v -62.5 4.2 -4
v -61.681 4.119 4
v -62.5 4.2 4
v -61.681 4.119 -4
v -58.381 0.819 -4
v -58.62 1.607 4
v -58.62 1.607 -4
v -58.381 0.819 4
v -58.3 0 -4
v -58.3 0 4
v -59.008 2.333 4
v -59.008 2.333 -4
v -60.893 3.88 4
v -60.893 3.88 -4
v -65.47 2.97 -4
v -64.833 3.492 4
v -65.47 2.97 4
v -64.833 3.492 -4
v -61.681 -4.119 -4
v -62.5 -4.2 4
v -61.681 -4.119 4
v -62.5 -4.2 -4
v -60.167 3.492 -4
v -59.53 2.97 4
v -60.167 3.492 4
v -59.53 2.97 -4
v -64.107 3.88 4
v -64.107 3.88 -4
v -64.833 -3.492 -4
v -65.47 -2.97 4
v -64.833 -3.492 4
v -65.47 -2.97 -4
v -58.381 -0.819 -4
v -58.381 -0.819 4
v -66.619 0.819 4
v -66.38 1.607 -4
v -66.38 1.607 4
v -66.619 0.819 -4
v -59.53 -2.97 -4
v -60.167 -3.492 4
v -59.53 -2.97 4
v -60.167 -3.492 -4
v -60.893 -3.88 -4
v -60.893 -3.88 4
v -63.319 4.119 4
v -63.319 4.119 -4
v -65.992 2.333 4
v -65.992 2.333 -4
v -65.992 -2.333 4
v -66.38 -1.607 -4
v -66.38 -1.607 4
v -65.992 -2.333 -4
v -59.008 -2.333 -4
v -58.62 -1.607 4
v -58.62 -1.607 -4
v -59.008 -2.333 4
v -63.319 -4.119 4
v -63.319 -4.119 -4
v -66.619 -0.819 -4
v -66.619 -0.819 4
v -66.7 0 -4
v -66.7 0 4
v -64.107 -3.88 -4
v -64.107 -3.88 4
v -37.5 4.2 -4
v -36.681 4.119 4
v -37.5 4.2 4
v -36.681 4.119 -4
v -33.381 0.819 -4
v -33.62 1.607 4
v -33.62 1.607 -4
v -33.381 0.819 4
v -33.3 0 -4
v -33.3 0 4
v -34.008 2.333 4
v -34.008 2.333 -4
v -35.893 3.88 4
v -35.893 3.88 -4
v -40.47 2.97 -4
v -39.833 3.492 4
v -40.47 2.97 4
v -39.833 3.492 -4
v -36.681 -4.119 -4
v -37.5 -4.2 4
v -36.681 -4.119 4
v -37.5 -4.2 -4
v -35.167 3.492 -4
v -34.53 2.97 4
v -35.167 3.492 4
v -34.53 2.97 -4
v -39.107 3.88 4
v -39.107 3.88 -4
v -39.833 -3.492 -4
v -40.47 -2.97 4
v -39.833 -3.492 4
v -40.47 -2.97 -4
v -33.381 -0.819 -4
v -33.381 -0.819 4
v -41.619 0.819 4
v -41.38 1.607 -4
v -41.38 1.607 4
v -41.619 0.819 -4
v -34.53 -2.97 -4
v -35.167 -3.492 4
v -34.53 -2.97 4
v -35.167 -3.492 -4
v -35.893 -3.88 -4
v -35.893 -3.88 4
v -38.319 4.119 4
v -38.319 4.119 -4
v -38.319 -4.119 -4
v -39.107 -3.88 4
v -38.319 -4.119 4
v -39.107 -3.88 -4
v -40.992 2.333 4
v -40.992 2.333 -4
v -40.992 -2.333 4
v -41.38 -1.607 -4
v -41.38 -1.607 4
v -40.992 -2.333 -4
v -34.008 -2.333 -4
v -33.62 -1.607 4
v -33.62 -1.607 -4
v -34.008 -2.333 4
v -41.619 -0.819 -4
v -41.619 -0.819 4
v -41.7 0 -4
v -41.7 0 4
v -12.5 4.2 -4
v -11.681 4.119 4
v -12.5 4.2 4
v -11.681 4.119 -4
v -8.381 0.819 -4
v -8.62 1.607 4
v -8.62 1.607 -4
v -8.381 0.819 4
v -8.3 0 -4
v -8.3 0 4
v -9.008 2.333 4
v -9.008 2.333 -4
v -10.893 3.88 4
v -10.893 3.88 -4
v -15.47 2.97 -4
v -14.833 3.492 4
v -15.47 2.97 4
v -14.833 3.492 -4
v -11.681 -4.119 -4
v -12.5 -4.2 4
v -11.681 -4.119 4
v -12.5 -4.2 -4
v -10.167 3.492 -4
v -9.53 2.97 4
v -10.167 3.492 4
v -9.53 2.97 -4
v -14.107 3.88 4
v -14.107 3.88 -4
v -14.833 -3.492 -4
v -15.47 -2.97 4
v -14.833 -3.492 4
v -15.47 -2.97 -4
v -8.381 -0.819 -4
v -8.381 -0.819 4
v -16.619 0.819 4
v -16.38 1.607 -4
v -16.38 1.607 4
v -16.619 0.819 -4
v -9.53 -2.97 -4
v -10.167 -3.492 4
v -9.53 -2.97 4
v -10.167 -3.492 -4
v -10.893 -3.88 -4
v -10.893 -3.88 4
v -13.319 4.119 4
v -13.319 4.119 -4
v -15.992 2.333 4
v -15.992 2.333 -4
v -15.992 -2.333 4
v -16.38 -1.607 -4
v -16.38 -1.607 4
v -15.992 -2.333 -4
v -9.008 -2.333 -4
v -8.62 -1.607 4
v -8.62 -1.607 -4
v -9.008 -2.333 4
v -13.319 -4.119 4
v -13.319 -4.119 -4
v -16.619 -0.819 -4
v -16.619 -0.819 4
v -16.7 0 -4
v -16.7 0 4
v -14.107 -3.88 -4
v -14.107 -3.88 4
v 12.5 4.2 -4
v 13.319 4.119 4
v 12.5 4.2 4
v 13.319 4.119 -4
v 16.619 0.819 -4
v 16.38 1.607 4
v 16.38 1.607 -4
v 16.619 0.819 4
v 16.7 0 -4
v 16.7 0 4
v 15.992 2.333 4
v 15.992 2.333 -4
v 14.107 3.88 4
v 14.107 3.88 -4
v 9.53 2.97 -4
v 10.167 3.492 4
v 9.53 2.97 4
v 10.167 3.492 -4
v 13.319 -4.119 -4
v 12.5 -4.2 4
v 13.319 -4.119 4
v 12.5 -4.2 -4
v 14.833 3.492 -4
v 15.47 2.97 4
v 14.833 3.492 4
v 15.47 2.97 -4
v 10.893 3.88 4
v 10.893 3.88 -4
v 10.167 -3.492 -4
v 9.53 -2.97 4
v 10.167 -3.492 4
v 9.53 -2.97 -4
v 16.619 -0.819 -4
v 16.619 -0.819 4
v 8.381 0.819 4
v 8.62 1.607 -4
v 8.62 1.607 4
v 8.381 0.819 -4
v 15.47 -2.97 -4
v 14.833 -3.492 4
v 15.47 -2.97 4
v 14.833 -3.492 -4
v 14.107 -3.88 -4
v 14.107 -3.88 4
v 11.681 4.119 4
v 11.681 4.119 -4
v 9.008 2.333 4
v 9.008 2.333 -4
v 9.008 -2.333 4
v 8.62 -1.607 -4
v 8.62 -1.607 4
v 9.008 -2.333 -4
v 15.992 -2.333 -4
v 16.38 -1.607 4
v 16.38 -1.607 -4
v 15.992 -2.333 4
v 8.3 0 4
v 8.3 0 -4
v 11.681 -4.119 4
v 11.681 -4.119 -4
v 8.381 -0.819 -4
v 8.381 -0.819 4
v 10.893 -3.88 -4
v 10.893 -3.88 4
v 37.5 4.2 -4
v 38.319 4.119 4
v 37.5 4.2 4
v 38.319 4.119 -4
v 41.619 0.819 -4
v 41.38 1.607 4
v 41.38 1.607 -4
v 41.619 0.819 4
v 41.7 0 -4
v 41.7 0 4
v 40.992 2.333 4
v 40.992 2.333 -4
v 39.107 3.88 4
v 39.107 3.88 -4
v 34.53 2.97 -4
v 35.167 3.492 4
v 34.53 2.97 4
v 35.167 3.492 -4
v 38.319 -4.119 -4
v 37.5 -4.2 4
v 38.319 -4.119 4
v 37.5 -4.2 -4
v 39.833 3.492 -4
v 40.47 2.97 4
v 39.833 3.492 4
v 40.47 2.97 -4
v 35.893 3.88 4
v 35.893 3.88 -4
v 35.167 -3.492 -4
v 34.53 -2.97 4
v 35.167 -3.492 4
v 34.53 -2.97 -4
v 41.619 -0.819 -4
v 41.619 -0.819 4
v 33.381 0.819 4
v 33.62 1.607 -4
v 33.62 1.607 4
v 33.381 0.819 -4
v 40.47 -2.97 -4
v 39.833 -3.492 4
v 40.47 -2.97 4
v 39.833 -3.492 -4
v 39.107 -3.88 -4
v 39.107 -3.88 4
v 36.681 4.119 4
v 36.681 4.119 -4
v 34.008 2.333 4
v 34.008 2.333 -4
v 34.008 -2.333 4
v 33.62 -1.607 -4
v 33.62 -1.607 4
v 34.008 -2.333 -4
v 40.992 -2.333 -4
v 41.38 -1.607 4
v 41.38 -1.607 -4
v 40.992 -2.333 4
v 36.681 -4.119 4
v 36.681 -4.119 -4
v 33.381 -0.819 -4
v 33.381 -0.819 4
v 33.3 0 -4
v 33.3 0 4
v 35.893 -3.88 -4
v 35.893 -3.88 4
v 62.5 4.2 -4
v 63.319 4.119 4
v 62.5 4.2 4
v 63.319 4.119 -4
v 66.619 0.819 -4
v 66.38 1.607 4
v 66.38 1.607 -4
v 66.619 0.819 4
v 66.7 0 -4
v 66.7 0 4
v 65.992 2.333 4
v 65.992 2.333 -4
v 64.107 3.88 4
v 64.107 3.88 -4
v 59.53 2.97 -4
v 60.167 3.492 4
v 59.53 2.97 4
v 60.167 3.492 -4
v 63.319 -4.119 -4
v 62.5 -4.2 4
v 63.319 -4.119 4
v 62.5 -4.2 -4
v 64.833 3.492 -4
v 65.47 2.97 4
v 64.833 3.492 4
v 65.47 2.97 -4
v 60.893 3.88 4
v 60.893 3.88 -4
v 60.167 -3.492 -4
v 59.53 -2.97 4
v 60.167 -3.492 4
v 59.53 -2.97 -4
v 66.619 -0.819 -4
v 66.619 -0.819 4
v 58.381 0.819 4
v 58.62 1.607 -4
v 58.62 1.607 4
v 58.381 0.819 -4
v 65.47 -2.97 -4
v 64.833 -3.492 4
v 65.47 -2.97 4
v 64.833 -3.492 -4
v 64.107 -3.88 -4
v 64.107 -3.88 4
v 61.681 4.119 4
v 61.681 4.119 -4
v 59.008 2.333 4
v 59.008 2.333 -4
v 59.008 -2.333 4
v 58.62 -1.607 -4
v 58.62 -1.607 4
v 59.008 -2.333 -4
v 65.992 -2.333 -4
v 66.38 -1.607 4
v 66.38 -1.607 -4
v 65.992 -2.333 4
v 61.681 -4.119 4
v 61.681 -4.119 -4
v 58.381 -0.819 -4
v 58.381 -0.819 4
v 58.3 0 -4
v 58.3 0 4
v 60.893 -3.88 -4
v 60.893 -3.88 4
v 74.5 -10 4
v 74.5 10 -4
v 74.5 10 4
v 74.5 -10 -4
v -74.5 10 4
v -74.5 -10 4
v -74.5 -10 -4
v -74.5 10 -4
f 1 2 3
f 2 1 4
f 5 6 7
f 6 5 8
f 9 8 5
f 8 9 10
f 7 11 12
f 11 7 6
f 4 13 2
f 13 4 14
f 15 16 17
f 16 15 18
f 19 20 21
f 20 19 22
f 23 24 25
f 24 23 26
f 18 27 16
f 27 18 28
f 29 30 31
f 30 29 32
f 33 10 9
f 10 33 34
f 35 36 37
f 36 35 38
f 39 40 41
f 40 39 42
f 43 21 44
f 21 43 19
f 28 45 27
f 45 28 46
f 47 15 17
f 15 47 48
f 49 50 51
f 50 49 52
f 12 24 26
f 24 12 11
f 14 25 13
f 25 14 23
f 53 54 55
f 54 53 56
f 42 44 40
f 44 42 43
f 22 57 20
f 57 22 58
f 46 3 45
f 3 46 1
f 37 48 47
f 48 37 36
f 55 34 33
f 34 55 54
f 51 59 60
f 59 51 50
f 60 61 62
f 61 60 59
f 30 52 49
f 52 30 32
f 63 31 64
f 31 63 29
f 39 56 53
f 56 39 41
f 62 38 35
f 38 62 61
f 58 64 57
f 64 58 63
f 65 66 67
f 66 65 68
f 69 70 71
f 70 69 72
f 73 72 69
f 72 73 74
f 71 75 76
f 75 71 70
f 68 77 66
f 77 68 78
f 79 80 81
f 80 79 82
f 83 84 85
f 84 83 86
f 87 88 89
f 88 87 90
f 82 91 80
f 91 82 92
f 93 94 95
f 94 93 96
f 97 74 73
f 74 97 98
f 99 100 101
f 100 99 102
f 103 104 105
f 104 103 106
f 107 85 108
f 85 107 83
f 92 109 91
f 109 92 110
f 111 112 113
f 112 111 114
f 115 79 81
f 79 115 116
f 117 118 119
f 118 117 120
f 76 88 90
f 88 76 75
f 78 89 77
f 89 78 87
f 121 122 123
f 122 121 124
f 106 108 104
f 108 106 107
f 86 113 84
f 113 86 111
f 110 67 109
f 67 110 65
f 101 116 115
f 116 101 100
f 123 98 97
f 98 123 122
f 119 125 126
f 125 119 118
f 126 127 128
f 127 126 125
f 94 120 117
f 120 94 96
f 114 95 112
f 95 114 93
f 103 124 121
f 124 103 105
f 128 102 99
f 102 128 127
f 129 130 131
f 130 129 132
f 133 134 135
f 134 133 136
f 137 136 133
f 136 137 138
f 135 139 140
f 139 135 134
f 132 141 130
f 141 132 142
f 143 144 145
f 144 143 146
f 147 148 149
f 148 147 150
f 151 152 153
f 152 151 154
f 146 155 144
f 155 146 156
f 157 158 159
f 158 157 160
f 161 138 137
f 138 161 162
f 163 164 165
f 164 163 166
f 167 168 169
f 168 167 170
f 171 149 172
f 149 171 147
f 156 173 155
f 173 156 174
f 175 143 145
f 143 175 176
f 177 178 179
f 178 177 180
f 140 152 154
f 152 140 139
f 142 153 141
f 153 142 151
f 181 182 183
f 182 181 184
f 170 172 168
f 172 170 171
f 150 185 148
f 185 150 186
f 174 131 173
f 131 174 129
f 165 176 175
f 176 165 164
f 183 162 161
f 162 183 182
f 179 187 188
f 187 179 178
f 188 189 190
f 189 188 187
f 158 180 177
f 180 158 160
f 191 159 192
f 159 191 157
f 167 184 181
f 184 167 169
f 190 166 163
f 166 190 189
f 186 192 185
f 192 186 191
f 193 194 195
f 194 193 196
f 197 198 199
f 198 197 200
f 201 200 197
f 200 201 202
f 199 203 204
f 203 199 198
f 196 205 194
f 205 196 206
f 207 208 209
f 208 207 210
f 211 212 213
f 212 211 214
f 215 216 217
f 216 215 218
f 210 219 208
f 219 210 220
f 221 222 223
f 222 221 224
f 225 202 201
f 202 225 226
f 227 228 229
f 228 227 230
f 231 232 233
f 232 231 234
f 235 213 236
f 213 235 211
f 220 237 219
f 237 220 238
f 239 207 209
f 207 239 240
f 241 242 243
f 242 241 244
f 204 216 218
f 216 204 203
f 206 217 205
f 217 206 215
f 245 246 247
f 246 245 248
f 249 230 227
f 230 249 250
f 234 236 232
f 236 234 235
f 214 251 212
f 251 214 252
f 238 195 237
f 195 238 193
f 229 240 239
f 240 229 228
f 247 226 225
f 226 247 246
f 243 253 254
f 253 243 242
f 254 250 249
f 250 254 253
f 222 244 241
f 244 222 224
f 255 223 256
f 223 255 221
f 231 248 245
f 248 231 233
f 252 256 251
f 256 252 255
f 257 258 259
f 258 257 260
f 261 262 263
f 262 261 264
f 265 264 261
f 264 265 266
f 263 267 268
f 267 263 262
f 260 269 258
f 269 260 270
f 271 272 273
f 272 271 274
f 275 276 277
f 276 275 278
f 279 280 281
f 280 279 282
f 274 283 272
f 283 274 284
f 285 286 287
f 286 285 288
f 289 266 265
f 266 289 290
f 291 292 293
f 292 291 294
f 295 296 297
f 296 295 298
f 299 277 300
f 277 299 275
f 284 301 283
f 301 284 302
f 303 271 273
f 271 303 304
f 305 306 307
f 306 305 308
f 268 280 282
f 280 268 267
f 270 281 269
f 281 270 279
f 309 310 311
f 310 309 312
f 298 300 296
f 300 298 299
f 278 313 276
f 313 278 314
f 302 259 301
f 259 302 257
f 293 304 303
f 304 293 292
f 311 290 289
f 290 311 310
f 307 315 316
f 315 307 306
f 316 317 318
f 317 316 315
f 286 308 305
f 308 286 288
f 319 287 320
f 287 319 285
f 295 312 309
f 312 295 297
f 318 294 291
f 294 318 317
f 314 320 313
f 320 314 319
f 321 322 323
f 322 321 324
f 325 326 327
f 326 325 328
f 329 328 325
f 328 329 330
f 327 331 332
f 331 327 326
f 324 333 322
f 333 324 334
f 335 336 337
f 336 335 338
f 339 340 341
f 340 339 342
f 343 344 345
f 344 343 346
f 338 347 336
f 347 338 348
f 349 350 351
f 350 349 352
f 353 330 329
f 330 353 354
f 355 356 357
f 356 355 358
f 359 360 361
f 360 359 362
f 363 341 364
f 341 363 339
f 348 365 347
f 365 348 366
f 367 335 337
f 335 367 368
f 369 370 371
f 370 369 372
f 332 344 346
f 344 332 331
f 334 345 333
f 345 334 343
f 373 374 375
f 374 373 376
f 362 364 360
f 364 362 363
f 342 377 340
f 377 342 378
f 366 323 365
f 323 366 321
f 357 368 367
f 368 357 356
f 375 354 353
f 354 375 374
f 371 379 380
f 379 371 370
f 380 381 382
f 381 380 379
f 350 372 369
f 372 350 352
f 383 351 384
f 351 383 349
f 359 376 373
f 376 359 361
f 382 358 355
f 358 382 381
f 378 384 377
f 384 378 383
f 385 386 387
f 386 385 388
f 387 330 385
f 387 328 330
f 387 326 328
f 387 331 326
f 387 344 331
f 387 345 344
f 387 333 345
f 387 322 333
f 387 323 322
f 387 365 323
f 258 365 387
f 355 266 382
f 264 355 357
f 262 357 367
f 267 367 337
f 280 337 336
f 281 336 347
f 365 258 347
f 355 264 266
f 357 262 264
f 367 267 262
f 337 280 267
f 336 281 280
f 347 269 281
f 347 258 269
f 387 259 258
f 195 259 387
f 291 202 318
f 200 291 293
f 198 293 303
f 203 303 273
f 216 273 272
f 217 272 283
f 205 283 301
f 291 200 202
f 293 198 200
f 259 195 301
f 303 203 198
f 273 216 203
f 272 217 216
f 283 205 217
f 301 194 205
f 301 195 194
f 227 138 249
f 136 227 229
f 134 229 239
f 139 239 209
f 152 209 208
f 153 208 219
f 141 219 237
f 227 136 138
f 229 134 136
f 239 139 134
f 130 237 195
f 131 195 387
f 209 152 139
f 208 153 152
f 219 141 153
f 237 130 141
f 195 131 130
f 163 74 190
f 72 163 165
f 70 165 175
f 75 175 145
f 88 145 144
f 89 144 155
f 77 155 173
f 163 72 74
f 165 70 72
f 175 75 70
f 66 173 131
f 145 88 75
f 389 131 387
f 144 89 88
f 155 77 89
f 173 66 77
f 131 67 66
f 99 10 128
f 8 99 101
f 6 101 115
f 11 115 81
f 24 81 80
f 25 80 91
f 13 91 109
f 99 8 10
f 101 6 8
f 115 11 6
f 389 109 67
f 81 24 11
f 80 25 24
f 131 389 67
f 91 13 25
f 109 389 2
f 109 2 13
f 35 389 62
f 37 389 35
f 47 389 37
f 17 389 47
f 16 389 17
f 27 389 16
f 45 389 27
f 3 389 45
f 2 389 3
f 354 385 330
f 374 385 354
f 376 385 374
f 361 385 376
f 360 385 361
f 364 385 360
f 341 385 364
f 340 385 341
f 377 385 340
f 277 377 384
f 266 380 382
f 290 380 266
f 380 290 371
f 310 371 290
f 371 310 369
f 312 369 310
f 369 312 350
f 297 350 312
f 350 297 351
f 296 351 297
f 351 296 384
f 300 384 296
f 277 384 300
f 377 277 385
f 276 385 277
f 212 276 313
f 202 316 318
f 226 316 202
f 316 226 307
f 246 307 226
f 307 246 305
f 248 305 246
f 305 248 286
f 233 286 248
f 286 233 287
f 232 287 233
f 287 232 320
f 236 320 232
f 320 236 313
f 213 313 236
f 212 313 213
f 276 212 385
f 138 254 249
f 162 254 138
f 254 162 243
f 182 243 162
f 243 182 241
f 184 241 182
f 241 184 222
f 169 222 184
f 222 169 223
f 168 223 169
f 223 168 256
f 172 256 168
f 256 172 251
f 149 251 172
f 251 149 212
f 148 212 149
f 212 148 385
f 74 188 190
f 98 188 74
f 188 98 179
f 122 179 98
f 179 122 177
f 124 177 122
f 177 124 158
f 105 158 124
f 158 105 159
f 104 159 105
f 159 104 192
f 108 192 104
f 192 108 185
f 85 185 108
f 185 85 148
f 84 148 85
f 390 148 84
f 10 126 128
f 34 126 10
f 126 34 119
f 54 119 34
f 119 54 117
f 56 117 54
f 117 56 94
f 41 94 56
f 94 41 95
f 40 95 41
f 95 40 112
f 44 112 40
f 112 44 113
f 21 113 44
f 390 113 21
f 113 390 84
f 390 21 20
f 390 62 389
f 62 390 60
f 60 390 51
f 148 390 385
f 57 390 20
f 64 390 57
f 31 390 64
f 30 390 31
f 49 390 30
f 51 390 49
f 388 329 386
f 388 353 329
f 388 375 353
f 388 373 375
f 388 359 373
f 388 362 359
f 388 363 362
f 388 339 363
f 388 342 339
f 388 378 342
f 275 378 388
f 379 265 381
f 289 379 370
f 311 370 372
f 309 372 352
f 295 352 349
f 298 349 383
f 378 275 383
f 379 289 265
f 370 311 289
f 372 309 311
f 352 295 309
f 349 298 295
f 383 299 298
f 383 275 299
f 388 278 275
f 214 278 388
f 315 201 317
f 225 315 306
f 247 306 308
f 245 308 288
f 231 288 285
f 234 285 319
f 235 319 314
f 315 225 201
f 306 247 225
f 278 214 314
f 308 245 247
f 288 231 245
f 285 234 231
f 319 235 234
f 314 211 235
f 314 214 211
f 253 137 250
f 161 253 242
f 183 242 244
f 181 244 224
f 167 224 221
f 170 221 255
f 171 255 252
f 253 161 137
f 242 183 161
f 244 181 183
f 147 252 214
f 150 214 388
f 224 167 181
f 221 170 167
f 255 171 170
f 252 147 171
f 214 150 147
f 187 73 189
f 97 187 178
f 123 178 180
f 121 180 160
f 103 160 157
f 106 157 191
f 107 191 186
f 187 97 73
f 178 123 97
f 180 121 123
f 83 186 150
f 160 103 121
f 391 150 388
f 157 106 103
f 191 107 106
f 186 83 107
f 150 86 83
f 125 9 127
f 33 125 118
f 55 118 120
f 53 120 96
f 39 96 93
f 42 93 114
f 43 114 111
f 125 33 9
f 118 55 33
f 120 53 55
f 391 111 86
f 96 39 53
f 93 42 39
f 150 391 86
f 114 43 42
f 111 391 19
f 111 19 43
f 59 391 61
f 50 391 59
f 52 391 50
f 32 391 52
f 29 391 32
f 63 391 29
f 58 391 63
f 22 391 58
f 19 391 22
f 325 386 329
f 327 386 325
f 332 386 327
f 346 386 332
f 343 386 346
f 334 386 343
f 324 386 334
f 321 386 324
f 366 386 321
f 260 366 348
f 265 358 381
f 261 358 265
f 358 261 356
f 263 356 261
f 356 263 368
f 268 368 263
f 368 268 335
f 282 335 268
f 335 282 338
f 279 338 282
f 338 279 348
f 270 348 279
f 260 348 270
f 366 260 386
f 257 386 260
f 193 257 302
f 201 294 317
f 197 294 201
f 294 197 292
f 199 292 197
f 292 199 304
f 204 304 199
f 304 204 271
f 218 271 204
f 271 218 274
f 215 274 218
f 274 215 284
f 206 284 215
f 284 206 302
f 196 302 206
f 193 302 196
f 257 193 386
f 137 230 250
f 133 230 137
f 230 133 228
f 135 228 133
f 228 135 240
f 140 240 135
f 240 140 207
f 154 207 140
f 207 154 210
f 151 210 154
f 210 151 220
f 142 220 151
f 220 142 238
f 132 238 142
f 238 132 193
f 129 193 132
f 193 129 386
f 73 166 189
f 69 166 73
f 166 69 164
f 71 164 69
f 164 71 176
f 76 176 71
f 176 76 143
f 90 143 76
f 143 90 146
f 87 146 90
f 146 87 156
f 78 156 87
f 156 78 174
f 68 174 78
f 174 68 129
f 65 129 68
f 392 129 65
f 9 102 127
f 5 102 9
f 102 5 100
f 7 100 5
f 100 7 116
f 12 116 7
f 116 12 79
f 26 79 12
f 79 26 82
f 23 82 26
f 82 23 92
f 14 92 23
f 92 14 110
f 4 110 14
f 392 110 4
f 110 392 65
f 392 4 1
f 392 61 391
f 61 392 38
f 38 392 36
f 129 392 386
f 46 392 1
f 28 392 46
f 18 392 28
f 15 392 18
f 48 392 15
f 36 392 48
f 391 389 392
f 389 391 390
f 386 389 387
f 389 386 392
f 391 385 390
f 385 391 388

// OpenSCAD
$fn = 32;

// ----------------------------------------------------------------------
// Hole bar, 6 x Ø8.4
// skip layout, 12 mm edge offset
// ----------------------------------------------------------------------

// --- parameters (mm) ---
bar_w = 20;         // bar width (Y)
bar_t = 8;          // bar thickness (Z)
holes = 6;          // holes per row
hole_d = 8.4;       // hole diameter
edge = 12;          // offset from the bar end to the first hole
grid_pitch = 12.5;  // grid the bar was laid out on

// --- derived feature positions (mm) ---
pitch = grid_pitch * 2;       // = 25   holes sit every other grid slot
span = (holes - 1) * pitch;   // = 125   distance between the end holes
bar_l = span + 2 * edge;      // = 149   overall bar length
start_x = -bar_l / 2 + edge;  // = -62.5   X of the first hole
feature_centers = [
  [start_x + 0 * pitch, 0],
  [start_x + 1 * pitch, 0],
  [start_x + 2 * pitch, 0],
  [start_x + 3 * pitch, 0],
  [start_x + 4 * pitch, 0],
  [start_x + 5 * pitch, 0]
];   // hole centres of the first row

// bar with one row of holes, drilled from feature_centers
difference() {
  translate([-bar_l / 2, -bar_w / 2, -bar_t / 2]) cube([bar_l, bar_w, bar_t]);
  for (centre = feature_centers)
    translate([centre[0], centre[1], 0])
      cylinder(d = hole_d, h = bar_t + 2, center = true);
}
